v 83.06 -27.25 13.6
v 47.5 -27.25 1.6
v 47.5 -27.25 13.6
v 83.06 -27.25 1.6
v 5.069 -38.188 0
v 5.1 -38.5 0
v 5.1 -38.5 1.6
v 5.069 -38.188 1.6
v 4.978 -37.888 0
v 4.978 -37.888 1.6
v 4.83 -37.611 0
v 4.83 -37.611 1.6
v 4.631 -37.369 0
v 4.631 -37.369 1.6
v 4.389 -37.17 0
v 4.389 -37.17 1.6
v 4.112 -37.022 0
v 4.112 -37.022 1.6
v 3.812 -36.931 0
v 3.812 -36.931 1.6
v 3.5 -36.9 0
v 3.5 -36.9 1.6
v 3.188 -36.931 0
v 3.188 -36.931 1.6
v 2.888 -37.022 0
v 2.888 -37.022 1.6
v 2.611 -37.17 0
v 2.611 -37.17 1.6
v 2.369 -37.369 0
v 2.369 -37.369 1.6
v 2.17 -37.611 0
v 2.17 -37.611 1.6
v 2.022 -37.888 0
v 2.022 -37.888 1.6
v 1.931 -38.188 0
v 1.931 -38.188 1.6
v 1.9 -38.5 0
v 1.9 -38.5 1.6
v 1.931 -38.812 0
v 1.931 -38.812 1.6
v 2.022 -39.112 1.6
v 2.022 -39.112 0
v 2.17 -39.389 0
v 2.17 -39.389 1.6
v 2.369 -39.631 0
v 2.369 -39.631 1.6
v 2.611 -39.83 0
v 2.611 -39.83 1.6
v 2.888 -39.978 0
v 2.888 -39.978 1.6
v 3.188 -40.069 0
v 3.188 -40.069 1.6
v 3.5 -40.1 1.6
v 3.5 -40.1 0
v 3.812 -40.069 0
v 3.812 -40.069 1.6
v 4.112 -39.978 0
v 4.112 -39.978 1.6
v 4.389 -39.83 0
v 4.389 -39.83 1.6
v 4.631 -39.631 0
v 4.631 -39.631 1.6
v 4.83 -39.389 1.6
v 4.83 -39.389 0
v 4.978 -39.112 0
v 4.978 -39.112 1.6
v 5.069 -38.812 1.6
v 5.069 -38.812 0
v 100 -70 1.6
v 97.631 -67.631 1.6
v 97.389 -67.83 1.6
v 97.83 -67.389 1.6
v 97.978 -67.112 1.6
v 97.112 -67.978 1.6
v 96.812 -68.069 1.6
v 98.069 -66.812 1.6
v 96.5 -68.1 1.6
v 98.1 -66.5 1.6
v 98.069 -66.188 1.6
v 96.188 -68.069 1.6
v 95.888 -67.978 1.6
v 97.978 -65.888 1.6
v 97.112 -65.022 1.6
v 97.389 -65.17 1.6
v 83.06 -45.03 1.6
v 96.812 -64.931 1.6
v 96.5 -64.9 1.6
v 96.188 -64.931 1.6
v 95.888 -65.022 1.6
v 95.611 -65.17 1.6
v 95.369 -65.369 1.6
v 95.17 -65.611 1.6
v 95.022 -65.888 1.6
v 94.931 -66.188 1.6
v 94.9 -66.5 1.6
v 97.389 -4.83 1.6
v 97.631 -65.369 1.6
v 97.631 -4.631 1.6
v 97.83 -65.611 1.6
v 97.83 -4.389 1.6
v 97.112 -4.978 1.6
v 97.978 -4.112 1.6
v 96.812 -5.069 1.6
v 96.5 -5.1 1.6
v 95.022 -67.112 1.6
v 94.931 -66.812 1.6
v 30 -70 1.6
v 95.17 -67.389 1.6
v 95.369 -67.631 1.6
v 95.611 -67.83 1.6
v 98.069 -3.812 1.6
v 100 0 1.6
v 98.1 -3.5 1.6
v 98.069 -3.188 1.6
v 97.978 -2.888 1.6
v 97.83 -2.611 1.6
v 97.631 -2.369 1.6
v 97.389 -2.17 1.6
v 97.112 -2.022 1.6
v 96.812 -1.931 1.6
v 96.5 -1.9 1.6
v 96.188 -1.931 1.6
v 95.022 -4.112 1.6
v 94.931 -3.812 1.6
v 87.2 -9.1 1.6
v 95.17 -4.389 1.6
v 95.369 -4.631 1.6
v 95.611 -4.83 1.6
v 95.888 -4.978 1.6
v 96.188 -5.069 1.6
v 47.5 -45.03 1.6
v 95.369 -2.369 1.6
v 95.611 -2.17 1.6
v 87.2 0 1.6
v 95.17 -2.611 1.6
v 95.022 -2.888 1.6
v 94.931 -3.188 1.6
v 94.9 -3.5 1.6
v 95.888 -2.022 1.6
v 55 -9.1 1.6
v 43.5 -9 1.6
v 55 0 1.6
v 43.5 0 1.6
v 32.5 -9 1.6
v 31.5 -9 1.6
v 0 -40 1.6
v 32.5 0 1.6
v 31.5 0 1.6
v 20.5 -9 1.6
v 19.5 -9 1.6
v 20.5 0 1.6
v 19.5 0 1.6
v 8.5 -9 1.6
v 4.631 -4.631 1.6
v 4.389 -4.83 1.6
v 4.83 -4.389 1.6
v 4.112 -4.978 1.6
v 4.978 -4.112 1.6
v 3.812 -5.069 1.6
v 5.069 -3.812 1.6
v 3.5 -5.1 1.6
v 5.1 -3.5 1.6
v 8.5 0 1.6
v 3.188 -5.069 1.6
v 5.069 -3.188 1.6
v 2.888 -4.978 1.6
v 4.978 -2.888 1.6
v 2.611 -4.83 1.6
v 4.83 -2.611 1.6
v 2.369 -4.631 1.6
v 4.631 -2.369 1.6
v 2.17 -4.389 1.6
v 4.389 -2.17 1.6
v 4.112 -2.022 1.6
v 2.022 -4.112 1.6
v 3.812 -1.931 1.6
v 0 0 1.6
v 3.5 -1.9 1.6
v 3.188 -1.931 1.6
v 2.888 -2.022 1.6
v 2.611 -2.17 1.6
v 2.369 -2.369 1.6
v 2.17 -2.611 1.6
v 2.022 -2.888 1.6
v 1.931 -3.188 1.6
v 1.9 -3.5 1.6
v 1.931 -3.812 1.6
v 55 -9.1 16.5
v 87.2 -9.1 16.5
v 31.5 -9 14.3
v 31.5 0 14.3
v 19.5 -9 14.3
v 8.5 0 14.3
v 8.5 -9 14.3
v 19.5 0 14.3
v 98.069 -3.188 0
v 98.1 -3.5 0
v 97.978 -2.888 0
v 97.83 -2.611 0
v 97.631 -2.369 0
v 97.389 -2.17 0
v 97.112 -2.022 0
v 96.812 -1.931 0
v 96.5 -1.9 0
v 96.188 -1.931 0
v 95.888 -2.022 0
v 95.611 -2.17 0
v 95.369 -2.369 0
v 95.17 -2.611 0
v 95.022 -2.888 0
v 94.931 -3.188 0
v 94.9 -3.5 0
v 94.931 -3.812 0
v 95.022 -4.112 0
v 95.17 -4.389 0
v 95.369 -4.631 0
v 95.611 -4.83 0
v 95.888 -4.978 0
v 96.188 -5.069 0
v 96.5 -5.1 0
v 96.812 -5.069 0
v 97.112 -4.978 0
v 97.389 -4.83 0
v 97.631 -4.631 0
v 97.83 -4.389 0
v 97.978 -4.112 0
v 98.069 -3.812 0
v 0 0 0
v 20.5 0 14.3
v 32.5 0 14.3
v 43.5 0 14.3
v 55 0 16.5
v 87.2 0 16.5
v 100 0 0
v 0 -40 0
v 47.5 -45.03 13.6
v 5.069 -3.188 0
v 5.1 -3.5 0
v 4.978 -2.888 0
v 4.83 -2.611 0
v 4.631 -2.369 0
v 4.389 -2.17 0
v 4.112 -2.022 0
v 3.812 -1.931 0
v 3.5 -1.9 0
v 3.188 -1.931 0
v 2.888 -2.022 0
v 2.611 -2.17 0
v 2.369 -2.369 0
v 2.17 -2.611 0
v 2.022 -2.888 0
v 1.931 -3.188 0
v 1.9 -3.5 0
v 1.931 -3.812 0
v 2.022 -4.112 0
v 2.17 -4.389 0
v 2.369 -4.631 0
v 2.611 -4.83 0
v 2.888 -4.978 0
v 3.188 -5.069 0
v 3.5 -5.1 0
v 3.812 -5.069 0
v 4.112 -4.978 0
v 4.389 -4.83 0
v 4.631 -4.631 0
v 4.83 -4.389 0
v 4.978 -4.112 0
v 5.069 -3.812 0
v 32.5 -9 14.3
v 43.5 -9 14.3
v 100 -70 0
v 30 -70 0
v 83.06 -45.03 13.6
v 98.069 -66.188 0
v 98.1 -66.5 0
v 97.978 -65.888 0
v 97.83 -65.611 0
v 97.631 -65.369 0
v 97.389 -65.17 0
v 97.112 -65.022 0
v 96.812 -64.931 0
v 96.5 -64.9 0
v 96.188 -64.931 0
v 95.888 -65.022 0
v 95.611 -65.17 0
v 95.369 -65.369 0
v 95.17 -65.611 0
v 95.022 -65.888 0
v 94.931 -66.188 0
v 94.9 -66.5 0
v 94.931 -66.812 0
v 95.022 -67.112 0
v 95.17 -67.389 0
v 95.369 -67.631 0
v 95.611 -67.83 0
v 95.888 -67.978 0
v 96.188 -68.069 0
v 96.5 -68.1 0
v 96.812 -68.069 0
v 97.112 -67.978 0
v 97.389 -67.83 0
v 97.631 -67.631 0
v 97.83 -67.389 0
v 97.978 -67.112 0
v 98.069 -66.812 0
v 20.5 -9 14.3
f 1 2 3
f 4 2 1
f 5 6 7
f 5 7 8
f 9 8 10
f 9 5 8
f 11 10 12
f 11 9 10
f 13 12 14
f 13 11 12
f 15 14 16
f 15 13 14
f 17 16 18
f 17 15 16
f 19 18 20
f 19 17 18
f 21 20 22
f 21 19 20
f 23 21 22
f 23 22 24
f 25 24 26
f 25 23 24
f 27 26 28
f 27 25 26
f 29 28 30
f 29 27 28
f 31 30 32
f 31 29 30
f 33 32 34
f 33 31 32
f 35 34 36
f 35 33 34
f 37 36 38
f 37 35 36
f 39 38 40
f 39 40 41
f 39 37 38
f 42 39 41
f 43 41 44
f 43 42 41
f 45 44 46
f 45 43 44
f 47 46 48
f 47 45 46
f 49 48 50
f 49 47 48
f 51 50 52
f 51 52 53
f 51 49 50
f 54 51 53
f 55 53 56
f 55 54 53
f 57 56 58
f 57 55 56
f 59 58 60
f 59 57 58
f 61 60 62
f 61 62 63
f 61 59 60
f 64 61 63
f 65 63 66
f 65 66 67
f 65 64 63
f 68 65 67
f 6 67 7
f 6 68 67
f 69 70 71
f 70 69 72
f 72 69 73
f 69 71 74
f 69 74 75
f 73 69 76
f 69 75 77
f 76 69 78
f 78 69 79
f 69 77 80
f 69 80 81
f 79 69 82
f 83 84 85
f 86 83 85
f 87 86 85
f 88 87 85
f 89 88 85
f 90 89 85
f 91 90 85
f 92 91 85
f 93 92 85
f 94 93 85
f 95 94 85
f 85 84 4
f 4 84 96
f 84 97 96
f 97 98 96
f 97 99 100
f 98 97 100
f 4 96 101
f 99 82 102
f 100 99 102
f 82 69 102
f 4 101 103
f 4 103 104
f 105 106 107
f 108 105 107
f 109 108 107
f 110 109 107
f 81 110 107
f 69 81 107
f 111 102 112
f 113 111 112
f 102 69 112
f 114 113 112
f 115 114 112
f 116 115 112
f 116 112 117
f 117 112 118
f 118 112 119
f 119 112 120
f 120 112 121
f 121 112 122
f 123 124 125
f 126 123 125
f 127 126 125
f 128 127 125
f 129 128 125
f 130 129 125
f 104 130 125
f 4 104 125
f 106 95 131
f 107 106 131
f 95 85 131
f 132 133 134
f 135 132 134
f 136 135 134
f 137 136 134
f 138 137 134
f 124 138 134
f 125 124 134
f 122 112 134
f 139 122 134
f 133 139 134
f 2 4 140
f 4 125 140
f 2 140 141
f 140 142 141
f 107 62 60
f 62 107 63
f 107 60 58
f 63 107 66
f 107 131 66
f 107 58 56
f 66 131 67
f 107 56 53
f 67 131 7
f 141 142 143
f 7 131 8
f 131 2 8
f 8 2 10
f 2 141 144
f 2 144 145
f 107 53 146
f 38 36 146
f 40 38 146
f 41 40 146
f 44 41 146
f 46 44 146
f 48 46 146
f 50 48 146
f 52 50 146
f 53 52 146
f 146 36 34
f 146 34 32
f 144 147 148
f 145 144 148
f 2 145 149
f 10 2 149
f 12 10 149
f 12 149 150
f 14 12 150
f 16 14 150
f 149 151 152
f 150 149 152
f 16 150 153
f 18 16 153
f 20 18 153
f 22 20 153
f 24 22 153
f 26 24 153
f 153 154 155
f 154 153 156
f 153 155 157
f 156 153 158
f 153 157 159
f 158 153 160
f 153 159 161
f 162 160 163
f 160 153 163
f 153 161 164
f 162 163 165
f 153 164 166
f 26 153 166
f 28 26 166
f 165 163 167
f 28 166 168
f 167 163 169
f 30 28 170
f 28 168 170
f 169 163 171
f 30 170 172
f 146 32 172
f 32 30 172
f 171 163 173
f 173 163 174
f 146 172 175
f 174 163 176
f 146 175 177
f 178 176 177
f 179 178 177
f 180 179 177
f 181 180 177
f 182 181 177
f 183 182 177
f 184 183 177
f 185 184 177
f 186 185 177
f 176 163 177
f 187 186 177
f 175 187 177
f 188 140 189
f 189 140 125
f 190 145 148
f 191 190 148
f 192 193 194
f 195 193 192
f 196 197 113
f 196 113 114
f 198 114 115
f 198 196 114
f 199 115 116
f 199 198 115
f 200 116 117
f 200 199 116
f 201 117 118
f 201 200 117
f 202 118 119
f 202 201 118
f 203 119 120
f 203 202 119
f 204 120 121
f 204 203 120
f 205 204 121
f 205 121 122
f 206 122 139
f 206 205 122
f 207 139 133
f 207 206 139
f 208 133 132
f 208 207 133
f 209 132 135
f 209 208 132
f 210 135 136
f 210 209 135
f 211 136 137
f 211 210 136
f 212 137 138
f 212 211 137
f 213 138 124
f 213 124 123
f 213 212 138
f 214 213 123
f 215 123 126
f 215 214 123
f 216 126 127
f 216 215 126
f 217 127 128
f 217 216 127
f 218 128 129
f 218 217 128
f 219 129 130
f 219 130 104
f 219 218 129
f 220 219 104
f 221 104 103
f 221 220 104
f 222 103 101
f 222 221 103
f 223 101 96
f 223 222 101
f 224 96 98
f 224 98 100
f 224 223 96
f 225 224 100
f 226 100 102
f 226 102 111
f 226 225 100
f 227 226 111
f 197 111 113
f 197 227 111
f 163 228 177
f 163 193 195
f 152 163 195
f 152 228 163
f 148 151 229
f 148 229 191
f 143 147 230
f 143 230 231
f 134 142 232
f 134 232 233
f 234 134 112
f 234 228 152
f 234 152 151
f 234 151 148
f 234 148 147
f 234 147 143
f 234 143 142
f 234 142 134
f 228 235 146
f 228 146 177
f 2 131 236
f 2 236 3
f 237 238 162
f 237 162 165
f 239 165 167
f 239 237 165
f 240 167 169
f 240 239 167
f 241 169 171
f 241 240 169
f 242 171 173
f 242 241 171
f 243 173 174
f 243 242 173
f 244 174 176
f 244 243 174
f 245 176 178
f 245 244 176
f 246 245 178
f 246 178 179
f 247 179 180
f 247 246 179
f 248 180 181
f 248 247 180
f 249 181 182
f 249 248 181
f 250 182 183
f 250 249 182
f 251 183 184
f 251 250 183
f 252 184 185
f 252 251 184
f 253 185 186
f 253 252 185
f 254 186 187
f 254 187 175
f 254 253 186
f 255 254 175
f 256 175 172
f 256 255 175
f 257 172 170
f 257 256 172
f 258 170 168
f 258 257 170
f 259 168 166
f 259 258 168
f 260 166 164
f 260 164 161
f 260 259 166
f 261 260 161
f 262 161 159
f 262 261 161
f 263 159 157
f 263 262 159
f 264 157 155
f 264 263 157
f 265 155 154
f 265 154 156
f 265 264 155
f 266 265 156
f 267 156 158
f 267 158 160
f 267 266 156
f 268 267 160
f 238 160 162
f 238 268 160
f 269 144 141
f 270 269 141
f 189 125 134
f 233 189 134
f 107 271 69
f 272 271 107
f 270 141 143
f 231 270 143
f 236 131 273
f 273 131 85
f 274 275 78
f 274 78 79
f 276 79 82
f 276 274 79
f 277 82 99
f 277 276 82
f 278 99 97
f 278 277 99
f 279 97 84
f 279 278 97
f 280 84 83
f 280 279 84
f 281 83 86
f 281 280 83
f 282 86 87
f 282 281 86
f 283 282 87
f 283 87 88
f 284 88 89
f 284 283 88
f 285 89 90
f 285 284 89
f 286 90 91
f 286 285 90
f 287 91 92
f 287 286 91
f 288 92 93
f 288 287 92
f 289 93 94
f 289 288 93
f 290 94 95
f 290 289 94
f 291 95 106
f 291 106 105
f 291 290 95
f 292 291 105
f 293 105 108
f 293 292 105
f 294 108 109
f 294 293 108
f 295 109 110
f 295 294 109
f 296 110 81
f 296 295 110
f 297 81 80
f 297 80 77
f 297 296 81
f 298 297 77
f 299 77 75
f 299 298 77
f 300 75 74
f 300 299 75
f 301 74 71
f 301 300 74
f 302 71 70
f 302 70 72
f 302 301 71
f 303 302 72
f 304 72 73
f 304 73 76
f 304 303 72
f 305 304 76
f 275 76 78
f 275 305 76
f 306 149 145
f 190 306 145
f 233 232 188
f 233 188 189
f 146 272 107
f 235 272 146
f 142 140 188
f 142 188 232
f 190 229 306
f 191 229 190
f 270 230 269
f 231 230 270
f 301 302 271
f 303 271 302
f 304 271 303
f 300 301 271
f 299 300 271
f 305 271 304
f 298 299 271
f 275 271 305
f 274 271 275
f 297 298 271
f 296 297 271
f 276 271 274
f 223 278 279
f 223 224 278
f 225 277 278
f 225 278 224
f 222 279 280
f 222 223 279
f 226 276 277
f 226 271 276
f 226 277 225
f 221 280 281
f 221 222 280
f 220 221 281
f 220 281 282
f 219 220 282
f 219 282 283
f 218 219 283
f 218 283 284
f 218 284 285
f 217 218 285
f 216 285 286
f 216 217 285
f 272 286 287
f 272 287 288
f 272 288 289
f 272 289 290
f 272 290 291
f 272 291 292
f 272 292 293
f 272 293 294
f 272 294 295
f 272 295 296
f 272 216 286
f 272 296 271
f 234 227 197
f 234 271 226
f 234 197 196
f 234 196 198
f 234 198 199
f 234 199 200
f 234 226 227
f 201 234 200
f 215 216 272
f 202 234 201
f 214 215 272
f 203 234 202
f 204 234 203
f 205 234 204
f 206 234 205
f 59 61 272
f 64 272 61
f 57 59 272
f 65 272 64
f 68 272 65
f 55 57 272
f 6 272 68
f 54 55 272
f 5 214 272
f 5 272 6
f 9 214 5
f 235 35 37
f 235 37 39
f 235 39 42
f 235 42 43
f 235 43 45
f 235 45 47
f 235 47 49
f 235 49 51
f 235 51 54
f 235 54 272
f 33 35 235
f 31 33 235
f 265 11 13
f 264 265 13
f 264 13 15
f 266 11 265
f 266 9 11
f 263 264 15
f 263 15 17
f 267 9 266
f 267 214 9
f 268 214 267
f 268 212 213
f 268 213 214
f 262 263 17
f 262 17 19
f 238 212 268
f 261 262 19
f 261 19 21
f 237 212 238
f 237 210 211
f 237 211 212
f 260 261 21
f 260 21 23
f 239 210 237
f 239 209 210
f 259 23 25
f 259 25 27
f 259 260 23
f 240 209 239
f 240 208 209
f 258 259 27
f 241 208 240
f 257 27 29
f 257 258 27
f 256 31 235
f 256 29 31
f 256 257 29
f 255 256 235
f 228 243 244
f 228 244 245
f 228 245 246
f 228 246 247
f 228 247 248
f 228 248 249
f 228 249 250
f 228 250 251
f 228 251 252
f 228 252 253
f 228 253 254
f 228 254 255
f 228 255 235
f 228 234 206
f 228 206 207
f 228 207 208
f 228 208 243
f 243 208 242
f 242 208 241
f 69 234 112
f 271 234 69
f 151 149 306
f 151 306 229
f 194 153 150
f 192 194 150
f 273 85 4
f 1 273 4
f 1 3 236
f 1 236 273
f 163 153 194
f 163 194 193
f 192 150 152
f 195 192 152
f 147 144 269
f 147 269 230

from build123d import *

# Parameters (mm, degrees)
ESQUISSE1_R        = 1.6
BOSS_EXTRU_1_DEPTH = 1.6
ESQUISSE2_W        = 11
ESQUISSE2_H        = 9
BOSS_EXTRU_2_DEPTH = 12.7
ESQUISSE3_W        = 32.2
ESQUISSE3_H        = 9.1
BOSS_EXTRU_3_DEPTH = 14.9
ESQUISSE4_W        = 35.56
ESQUISSE4_H        = 17.78
BOSS_EXTRU_4_DEPTH = 12


with BuildPart() as part:
    # Esquisse1 → Boss.-Extru.1 (new body)
    with BuildSketch(Plane.XY):
        Polygon((0, 0), (100, 0), (100, -70), (30, -70), (0, -40), align=None)
        with Locations((3.5, -3.5)):
            Circle(ESQUISSE1_R, mode=Mode.SUBTRACT)
        with Locations((96.5, -3.5)):
            Circle(ESQUISSE1_R, mode=Mode.SUBTRACT)
        with Locations((3.5, -38.5)):
            Circle(ESQUISSE1_R, mode=Mode.SUBTRACT)
        with Locations((96.5, -66.5)):
            Circle(ESQUISSE1_R, mode=Mode.SUBTRACT)
    extrude(amount=BOSS_EXTRU_1_DEPTH)

    # Esquisse2 → Boss.-Extru.2 (add)
    with BuildSketch(Plane.XY.offset(1.6)):
        with Locations((14, -4.5)):
            Rectangle(ESQUISSE2_W, ESQUISSE2_H)
        with Locations((26, -4.5)):
            Rectangle(ESQUISSE2_W, ESQUISSE2_H)
        with Locations((38, -4.5)):
            Rectangle(ESQUISSE2_W, ESQUISSE2_H)
    extrude(amount=BOSS_EXTRU_2_DEPTH)

    # Esquisse3 → Boss.-Extru.3 (add)
    with BuildSketch(Plane.XY.offset(1.6)):
        with Locations((71.1, -4.55)):
            Rectangle(ESQUISSE3_W, ESQUISSE3_H)
    extrude(amount=BOSS_EXTRU_3_DEPTH)

    # Esquisse4 → Boss.-Extru.4 (add)
    with BuildSketch(Plane.XY.offset(1.6)):
        with Locations((65.28, -36.14)):
            Rectangle(ESQUISSE4_W, ESQUISSE4_H)
    extrude(amount=BOSS_EXTRU_4_DEPTH)


solid = part.part
